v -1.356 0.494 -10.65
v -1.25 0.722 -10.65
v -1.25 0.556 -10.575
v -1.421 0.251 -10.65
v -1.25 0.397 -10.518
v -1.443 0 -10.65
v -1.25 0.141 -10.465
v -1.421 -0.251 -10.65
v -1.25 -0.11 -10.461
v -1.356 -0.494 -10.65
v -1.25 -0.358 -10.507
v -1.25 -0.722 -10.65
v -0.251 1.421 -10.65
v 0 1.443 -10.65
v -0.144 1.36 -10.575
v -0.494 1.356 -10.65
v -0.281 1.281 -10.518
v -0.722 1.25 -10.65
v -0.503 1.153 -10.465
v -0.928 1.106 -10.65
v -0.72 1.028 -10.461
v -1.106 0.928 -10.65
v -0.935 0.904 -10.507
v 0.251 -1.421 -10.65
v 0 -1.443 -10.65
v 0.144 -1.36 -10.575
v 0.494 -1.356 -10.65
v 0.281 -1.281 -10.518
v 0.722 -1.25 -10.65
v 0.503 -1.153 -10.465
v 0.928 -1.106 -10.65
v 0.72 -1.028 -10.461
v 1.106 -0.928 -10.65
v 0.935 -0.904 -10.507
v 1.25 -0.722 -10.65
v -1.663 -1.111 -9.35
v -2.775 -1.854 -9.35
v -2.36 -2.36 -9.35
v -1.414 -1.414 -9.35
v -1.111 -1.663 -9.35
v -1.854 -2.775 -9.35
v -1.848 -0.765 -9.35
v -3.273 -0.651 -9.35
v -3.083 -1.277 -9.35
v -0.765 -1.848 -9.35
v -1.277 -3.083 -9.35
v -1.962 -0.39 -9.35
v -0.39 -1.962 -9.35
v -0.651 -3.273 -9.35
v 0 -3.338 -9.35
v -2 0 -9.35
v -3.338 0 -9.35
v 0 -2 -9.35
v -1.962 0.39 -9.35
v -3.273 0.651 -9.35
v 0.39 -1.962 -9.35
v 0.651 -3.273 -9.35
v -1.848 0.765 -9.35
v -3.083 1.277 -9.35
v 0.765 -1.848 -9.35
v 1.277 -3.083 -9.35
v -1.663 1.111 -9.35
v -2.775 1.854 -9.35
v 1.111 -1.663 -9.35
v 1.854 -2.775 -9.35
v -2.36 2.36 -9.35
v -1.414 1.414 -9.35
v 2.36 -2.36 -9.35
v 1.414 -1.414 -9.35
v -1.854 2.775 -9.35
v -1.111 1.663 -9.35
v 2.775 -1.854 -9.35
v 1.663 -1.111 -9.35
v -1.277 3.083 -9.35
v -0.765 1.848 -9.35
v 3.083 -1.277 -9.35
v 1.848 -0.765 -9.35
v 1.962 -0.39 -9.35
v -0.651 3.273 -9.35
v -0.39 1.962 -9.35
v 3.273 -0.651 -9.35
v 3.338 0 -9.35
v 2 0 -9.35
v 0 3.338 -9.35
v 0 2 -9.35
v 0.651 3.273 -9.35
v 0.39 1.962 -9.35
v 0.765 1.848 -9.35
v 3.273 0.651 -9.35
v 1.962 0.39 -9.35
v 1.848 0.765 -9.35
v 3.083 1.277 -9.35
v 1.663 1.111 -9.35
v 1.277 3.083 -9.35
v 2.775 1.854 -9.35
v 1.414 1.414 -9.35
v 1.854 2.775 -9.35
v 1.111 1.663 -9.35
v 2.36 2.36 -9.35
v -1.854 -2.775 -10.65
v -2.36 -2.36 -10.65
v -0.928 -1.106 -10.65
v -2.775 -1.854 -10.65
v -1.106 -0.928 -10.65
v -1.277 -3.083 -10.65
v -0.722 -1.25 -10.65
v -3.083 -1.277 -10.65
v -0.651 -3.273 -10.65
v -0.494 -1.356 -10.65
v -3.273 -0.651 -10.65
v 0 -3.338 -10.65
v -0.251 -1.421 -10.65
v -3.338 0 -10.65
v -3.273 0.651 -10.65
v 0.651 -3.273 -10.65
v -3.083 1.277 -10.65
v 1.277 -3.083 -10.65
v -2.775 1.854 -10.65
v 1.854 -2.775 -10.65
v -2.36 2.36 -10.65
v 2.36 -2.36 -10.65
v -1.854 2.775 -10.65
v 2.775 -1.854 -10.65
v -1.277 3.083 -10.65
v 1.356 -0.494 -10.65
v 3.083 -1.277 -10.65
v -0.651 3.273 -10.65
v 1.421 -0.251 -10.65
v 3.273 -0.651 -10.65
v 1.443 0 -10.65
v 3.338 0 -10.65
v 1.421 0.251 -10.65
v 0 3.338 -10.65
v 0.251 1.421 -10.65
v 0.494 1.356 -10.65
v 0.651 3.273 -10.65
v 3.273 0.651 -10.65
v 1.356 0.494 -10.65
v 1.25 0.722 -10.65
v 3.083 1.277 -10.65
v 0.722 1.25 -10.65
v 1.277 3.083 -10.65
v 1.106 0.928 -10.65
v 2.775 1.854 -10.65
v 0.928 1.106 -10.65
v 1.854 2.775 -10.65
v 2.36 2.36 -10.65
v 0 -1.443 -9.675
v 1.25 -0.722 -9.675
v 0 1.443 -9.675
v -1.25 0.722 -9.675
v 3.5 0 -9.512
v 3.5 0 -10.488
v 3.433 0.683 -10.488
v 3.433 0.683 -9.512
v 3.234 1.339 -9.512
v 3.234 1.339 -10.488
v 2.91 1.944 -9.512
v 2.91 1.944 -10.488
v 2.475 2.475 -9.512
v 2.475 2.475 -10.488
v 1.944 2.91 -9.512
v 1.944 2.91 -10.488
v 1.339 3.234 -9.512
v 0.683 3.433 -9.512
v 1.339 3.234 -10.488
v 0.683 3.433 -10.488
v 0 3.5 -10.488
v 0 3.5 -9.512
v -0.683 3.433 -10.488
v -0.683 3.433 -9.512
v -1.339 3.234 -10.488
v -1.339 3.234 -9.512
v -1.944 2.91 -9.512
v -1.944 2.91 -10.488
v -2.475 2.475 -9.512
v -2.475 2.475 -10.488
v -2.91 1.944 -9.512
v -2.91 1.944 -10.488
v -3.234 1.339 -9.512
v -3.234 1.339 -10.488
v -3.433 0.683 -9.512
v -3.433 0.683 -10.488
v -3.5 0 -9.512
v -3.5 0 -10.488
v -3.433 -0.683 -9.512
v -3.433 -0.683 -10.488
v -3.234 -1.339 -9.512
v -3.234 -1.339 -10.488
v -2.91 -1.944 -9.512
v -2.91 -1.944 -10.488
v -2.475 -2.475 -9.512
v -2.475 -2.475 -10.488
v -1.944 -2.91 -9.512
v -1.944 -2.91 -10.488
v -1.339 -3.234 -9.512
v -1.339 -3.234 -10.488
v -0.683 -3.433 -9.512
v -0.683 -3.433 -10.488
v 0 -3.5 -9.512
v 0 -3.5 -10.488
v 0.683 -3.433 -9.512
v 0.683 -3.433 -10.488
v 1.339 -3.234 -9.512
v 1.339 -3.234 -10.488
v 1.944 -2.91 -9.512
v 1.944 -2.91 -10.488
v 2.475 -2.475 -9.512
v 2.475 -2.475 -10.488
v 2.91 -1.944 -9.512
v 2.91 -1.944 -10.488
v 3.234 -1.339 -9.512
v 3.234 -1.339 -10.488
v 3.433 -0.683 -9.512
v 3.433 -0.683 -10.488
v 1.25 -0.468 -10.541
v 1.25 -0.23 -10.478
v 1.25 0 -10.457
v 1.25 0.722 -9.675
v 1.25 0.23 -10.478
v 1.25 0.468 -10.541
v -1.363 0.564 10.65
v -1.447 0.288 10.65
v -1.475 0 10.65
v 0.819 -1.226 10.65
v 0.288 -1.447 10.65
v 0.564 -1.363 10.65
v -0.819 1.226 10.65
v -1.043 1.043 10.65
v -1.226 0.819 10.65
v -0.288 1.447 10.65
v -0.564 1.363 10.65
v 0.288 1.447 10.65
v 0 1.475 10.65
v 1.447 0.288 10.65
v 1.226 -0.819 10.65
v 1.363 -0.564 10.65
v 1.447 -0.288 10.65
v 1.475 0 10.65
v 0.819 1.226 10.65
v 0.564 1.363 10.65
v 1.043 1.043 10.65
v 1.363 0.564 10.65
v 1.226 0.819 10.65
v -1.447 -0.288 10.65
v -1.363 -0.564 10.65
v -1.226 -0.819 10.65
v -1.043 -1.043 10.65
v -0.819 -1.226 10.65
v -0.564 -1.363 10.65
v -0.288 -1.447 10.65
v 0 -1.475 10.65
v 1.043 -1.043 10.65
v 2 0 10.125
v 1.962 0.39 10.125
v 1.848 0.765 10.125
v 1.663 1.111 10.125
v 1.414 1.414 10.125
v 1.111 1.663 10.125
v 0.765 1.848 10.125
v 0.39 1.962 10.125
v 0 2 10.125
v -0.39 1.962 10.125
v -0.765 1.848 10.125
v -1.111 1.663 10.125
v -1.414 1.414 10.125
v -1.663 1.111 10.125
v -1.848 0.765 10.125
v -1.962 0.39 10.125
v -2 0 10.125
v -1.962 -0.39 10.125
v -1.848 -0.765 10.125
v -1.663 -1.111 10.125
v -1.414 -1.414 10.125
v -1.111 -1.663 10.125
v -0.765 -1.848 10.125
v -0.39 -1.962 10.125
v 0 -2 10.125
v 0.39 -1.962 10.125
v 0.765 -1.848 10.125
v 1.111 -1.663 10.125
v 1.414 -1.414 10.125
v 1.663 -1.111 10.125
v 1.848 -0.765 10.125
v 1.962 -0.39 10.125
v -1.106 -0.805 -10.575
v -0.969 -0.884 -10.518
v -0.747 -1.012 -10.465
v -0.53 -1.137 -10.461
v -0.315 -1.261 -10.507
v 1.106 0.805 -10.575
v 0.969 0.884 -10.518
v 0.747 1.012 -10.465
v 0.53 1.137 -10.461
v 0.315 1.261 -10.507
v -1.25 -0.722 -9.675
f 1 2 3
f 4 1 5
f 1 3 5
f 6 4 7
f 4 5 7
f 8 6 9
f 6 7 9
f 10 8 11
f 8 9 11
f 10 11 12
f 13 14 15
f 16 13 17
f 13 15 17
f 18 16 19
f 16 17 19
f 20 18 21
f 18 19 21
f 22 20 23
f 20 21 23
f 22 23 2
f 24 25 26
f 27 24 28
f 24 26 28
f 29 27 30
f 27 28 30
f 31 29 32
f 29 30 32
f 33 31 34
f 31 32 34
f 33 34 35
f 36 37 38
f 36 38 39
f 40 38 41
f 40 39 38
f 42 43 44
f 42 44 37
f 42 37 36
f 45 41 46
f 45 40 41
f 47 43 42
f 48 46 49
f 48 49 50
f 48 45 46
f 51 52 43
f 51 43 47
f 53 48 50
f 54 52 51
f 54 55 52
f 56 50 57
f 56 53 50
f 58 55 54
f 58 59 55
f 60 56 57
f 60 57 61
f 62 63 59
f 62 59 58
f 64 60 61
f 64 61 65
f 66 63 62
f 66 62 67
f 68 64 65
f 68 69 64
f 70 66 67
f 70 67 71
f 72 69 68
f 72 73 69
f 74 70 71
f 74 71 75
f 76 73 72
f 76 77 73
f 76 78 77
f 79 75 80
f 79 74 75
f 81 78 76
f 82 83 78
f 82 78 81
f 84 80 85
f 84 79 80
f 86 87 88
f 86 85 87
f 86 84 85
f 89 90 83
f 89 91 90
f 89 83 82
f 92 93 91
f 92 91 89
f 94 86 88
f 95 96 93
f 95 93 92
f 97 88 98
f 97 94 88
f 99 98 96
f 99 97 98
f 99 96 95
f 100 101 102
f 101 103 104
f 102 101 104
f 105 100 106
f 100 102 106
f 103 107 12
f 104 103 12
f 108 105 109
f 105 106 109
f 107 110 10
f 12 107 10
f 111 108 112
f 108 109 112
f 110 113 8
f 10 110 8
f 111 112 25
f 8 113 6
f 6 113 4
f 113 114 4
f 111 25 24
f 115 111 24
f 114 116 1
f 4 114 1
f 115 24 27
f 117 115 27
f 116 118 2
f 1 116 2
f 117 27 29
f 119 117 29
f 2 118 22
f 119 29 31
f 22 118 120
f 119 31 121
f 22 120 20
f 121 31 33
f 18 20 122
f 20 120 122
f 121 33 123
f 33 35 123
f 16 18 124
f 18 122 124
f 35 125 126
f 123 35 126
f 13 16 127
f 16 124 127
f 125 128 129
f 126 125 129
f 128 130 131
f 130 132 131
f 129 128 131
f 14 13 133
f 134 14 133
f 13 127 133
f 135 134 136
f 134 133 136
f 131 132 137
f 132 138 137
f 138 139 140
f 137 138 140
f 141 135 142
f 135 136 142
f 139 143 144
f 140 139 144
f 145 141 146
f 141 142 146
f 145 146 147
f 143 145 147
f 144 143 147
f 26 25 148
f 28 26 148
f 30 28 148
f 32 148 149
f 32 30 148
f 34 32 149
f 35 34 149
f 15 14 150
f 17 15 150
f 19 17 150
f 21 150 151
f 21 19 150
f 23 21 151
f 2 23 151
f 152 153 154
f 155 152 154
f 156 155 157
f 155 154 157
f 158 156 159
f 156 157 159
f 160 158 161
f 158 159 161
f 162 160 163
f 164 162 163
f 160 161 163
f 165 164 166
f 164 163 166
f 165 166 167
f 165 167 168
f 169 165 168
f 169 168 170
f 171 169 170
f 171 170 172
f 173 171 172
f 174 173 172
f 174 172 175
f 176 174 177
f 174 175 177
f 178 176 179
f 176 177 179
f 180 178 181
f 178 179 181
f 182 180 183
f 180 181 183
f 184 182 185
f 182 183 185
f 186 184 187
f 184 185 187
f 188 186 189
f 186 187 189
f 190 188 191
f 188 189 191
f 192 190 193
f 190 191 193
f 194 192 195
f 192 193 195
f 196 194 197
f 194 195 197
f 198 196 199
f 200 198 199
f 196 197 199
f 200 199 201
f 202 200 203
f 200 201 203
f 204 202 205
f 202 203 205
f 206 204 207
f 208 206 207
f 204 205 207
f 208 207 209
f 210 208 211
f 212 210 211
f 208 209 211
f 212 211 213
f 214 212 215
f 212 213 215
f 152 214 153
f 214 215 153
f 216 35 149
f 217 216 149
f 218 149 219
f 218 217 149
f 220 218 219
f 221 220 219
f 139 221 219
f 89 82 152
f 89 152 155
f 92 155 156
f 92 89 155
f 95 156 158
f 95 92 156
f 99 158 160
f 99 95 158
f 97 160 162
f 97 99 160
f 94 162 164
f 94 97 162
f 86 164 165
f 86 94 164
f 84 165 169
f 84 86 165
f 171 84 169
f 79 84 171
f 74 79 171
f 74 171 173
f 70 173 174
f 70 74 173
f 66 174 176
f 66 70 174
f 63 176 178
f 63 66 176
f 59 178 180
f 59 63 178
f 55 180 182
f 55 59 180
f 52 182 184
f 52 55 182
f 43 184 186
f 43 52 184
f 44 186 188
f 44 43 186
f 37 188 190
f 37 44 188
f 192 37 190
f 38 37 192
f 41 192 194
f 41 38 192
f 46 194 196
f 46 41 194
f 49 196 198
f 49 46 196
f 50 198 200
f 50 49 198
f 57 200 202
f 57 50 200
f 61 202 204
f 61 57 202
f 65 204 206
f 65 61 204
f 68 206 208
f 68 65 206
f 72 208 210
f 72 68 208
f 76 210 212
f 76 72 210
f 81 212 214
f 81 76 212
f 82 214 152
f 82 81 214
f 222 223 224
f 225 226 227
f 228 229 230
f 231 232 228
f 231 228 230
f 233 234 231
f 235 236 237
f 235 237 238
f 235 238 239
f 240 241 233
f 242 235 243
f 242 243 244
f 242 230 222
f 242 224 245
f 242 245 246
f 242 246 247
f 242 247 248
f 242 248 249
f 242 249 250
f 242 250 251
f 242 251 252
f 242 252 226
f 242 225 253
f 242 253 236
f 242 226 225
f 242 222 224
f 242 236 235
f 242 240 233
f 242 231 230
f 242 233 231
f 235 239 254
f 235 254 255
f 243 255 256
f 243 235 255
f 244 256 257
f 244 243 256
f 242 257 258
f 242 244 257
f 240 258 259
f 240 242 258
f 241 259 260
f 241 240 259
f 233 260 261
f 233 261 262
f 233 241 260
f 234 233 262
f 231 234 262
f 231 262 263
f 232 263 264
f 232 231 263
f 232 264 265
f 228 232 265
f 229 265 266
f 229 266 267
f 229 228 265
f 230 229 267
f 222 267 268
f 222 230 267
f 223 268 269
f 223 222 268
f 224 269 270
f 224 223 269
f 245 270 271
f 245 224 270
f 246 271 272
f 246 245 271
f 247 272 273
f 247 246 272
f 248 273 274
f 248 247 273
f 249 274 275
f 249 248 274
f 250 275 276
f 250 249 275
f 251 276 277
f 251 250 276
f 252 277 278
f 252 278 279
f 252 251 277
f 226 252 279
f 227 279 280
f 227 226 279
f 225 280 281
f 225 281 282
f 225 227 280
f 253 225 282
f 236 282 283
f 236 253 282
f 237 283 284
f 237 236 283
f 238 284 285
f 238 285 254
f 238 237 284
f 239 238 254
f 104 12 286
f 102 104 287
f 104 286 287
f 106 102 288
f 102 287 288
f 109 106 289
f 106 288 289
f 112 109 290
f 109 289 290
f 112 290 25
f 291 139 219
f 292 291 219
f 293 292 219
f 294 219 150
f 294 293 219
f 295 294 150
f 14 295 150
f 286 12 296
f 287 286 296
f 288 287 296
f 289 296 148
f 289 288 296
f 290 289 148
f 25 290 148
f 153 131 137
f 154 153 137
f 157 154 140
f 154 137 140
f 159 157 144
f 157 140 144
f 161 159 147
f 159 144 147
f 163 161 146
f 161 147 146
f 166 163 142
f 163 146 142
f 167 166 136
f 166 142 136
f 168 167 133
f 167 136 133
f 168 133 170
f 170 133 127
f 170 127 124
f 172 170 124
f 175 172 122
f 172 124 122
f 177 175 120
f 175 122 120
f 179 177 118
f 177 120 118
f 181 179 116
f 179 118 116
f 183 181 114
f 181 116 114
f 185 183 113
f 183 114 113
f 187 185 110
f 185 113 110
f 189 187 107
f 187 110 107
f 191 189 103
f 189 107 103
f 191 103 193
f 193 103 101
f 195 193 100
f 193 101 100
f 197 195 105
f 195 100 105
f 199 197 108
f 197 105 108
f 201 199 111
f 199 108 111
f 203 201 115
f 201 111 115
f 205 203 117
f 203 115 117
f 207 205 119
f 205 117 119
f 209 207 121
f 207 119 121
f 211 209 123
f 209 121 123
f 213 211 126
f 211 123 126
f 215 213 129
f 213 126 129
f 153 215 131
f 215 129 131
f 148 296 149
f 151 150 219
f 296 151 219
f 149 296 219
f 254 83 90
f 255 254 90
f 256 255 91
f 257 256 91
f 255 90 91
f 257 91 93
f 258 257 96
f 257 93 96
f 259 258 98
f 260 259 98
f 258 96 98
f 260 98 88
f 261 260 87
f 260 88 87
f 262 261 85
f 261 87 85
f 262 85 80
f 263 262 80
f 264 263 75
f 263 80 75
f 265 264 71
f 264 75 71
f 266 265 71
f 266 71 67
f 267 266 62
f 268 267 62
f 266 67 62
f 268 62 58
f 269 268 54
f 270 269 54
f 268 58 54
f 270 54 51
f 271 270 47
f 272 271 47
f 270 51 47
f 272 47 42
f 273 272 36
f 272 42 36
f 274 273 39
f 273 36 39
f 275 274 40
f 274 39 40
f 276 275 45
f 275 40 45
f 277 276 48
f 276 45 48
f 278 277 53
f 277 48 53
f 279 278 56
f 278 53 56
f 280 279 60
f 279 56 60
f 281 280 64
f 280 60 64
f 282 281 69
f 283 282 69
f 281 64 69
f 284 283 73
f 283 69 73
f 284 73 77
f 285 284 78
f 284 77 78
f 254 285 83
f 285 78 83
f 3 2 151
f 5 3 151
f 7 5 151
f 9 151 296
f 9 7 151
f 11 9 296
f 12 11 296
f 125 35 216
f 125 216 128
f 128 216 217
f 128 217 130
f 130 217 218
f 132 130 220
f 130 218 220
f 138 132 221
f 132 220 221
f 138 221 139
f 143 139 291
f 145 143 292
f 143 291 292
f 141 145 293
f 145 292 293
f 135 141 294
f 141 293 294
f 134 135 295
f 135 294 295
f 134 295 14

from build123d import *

# Parameters (mm, degrees)
EXTRUDE1_START     = -9.35
SKETCH1_R          = 2
EXTRUDE1_DEPTH     = 20
EXTRUDE2_START     = -10.65
SKETCH6_R          = 3.5
EXTRUDE2_DEPTH     = 1.3
CUT_EXTRUDE1_DEPTH = 0.975
SKETCH8_R          = 1.443375673
CUT_EXTRUDE2_DEPTH = 0.975
CUT_EXTRUDE2_TAPER = 45
CHAMFER1_SIZE      = 0.1625
CHAMFER2_SIZE      = 0.525


with BuildPart() as part:
    # Sketch1 → Extrude1 (new body)
    with BuildSketch(Plane.XY.offset(EXTRUDE1_START)):
        Circle(SKETCH1_R)
    extrude(amount=EXTRUDE1_DEPTH)

    # Sketch6 → Extrude2 (add)
    with BuildSketch(Plane.XY.offset(EXTRUDE2_START)):
        Circle(SKETCH6_R)
    extrude(amount=EXTRUDE2_DEPTH)

    # Sketch7 → Cut-Extrude1 (cut)
    with BuildSketch(Plane.XY.offset(-10.65)):
        Polygon((0, 1.443375673), (-1.25, 0.721687836), (-1.25, -0.721687836), (0, -1.443375673), (1.25, -0.721687836), (1.25, 0.721687836), align=None)
    extrude(amount=CUT_EXTRUDE1_DEPTH, mode=Mode.SUBTRACT)

    # Sketch8 → Cut-Extrude2 (cut)
    with BuildSketch(Plane.XY.offset(-10.65)):
        Circle(SKETCH8_R)
    extrude(amount=CUT_EXTRUDE2_DEPTH, taper=CUT_EXTRUDE2_TAPER, mode=Mode.SUBTRACT)

    # Chamfer1
    chamfer1_edges = [part.edges().sort_by_distance(p)[0] for p in [
        (-3.5, 0, -9.35),
        (-3.5, 0, -10.65),
    ]]
    chamfer(chamfer1_edges, length=CHAMFER1_SIZE)

    # Chamfer2
    chamfer2_edges = [part.edges().sort_by_distance(p)[0] for p in [
        (-2, 0, 10.65),
    ]]
    chamfer(chamfer2_edges, length=CHAMFER2_SIZE)


solid = part.part
